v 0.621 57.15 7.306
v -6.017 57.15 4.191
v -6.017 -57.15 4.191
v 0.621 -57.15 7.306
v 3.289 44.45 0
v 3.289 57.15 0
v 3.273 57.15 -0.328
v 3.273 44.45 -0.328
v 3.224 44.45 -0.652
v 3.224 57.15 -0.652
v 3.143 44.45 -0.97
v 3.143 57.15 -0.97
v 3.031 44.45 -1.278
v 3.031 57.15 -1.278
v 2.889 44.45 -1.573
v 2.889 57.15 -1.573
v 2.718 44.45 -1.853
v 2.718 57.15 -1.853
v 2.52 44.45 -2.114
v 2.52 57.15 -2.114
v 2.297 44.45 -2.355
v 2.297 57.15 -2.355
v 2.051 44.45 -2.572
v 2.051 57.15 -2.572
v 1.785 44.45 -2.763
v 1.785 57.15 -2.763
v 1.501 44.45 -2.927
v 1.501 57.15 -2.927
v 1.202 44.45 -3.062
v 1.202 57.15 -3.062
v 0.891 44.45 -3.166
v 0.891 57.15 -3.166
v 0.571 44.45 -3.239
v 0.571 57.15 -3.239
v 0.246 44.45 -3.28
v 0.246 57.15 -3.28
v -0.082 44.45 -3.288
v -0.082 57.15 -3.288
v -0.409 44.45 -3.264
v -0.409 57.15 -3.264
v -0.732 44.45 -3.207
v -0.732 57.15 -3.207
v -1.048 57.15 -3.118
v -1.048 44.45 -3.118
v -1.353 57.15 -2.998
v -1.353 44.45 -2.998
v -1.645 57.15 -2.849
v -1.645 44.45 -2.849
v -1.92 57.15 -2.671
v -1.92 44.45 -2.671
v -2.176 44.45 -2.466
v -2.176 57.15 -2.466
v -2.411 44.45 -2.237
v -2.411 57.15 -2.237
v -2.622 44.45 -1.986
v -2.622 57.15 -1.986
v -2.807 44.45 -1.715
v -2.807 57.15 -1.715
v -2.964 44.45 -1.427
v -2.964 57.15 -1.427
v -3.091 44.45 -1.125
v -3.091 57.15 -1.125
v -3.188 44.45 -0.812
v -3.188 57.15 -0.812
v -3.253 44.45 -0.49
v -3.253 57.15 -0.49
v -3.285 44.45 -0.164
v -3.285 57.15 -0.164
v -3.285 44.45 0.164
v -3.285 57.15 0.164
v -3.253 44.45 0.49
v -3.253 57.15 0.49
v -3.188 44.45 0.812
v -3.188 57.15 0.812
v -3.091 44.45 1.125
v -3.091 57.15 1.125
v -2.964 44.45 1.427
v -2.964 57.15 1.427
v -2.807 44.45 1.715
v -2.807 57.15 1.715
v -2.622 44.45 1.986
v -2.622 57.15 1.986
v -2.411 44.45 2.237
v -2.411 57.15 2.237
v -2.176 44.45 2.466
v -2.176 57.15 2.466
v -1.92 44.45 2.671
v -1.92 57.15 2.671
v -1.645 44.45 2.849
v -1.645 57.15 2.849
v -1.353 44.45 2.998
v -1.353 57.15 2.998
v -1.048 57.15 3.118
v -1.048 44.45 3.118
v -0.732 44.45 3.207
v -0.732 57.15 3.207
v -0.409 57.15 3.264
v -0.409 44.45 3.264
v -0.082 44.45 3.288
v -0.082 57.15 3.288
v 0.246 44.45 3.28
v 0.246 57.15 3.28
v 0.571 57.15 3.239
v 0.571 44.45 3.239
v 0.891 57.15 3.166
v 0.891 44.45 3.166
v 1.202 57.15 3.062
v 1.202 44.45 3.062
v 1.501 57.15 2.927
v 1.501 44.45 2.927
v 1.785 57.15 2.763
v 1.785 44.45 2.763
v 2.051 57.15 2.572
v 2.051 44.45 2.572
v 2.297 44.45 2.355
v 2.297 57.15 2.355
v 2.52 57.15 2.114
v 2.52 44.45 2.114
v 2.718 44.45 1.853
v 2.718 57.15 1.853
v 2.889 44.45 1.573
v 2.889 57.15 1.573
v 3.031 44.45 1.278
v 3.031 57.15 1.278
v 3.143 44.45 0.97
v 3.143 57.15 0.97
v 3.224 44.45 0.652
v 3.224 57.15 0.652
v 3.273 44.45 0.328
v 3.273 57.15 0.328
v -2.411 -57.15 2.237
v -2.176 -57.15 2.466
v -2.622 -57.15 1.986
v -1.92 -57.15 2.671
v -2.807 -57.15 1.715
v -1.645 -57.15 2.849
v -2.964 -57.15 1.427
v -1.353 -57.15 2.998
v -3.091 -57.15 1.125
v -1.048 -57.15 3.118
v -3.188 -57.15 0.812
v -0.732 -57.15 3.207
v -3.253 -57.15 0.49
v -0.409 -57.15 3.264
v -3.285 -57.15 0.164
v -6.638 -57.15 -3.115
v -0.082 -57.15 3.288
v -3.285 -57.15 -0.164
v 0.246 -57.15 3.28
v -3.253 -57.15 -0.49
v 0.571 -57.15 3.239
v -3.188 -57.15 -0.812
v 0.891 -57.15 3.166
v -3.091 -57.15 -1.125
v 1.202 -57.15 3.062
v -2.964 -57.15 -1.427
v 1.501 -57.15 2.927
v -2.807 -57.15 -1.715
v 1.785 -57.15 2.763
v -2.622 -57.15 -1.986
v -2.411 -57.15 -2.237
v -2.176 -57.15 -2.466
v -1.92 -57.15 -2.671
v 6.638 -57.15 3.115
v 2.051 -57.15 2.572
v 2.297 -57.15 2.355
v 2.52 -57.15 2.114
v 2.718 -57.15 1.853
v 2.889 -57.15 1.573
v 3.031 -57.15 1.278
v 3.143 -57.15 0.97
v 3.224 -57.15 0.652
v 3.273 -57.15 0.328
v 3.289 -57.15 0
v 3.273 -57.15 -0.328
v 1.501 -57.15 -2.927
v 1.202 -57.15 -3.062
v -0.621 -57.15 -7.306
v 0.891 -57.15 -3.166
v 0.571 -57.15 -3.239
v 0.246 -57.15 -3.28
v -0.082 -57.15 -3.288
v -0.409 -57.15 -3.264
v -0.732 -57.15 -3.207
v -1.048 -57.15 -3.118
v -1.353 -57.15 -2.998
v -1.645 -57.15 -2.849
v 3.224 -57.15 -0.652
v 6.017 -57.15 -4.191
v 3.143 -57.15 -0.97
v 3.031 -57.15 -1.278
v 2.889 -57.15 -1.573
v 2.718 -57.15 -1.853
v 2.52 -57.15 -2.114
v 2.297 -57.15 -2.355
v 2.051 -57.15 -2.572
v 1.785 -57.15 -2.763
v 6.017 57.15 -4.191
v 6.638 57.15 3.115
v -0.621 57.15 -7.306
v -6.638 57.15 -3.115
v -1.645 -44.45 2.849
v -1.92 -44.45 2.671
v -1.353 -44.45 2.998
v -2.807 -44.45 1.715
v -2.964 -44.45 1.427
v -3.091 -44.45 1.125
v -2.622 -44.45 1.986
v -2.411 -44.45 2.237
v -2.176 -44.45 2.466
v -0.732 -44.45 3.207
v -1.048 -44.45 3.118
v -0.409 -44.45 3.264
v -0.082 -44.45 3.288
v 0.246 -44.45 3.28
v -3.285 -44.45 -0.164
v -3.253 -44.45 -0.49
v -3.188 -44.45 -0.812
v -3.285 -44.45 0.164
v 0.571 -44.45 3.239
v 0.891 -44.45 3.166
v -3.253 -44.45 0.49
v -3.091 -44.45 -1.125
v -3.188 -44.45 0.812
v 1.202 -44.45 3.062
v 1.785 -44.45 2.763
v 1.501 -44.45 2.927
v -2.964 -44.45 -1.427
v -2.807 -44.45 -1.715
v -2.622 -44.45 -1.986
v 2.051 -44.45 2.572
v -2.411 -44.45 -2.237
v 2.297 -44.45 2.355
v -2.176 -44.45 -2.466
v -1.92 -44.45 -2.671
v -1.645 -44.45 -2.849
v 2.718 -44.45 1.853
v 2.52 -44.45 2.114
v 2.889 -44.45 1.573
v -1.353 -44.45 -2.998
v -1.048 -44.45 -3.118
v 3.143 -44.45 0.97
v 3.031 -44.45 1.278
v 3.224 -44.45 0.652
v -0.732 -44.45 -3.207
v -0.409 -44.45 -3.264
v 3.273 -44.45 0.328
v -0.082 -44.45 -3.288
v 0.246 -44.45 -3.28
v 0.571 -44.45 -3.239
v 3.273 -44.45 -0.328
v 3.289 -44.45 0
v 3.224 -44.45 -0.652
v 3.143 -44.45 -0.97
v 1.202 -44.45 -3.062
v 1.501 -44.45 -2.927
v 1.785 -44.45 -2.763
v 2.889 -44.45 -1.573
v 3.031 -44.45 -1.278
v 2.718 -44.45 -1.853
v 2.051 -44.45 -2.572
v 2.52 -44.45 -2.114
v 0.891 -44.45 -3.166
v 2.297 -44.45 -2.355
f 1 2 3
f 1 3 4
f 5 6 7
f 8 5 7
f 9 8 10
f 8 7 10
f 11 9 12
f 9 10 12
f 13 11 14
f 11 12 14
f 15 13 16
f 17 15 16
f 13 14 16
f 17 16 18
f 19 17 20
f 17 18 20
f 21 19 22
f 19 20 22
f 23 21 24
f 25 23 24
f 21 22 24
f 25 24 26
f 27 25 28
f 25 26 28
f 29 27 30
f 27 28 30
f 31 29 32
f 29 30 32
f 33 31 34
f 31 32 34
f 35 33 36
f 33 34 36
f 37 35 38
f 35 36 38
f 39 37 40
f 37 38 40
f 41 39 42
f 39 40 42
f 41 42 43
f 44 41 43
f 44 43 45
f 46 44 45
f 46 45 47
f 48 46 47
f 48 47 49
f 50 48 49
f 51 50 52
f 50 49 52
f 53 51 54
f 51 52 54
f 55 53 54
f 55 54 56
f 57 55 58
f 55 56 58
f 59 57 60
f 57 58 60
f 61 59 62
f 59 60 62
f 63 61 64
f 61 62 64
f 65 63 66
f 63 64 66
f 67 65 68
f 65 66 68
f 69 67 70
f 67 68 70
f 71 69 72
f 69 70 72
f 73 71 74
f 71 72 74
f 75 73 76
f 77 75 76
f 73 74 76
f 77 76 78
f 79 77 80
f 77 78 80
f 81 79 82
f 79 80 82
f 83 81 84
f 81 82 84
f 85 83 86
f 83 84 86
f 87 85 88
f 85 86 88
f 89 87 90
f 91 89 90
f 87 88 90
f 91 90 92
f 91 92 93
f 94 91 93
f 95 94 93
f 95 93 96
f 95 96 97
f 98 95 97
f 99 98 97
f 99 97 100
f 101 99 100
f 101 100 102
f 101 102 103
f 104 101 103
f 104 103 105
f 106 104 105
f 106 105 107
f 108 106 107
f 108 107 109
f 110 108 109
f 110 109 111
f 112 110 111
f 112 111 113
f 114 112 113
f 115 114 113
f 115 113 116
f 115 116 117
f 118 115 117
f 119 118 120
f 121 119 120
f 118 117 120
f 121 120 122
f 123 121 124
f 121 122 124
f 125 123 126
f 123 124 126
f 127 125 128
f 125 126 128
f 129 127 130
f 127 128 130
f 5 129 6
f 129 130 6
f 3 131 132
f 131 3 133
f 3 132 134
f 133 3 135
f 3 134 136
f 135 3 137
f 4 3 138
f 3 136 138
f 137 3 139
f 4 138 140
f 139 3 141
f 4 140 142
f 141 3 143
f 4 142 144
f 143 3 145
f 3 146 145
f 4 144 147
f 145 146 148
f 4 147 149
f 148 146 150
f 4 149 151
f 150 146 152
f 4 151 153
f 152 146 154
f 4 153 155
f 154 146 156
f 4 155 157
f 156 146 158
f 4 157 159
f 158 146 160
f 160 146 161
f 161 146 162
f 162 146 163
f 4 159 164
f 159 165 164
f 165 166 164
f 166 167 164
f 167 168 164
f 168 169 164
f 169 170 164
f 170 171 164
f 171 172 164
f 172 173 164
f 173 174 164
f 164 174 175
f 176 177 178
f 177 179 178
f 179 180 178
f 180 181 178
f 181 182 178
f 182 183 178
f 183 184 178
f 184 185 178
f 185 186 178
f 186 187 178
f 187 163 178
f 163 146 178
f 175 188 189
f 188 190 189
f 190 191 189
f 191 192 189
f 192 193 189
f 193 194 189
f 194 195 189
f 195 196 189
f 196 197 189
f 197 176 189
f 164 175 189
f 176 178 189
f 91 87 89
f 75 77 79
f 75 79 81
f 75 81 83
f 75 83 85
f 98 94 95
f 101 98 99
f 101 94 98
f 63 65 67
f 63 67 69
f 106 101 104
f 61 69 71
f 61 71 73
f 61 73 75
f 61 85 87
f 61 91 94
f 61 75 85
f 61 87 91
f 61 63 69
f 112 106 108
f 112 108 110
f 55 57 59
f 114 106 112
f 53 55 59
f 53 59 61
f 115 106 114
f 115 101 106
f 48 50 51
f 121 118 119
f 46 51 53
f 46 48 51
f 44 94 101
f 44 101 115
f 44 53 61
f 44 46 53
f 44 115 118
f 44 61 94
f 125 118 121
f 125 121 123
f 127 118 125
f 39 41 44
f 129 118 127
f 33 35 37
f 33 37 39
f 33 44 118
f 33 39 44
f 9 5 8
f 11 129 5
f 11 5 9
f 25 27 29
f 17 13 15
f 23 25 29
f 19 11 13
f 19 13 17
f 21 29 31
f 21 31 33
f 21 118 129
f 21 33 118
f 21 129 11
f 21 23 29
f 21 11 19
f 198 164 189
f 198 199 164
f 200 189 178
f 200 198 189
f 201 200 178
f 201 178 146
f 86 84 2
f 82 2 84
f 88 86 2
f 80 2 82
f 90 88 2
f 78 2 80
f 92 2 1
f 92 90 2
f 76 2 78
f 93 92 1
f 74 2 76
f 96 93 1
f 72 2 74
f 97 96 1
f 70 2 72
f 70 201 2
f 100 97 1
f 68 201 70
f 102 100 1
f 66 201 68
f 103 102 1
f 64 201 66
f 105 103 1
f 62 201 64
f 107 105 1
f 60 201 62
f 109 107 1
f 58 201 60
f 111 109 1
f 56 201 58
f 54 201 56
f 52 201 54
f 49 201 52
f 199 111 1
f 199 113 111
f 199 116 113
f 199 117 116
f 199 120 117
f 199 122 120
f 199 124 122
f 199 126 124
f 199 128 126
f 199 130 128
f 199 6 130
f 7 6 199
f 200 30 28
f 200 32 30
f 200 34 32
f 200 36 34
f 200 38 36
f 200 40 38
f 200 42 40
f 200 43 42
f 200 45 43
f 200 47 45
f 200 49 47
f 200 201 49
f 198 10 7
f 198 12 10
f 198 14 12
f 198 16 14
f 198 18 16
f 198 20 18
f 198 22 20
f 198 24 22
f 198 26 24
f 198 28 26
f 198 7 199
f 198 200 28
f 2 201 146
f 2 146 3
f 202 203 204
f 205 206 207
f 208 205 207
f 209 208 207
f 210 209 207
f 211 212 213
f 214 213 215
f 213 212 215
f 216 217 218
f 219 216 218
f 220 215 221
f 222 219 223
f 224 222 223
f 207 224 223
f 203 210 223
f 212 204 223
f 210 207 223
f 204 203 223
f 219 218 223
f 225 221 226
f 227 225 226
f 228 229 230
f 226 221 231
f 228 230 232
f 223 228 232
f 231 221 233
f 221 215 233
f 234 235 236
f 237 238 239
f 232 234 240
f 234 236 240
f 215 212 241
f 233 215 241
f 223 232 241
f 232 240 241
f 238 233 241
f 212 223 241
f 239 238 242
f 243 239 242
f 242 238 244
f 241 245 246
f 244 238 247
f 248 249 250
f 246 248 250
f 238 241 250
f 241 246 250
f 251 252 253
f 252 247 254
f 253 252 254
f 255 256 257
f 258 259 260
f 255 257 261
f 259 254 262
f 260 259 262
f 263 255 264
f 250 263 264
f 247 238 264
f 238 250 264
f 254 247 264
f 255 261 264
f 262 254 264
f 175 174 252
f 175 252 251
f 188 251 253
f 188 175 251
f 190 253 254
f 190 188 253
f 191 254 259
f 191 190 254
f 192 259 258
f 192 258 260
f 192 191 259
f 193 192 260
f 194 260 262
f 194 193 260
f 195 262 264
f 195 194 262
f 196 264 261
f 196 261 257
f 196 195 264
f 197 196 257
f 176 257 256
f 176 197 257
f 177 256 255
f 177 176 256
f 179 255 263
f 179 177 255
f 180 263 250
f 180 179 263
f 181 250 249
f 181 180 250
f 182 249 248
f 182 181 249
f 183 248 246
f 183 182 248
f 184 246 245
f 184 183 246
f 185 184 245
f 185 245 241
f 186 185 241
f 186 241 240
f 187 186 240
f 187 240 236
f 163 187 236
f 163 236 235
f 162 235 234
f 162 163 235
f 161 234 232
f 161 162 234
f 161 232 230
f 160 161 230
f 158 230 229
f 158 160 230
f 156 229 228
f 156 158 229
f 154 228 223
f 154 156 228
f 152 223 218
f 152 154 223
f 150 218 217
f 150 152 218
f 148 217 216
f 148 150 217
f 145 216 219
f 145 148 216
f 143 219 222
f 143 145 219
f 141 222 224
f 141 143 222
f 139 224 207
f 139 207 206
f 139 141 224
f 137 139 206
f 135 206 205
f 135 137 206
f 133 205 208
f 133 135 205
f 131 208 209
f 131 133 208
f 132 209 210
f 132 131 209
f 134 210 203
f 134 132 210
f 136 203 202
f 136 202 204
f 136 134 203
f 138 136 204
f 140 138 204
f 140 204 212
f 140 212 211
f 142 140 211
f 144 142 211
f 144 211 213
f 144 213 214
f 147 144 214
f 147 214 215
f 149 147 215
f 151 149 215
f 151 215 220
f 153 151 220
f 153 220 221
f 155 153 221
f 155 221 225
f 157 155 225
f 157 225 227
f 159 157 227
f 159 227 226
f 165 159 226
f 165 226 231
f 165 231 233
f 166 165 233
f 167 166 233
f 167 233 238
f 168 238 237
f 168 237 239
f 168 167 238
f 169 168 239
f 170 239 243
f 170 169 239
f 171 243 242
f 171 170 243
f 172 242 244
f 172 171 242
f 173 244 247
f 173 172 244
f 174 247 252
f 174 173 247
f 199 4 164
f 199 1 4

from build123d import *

# Parameters (mm, degrees)
BOSS_EXTRUDE1_DEPTH = 57.15
SKETCH2_R           = 3.2893
CUT_EXTRUDE1_DEPTH  = 12.7


with BuildPart() as part:
    # Sketch1 → Boss-Extrude1 (new body, symmetric)
    with BuildSketch(Plane(origin=(0, 0, 0), x_dir=(1, 0, 0), z_dir=(0, 1, 0))):
        Polygon((6.016541477, 4.191009662), (-0.621250096, 7.305982593), (-6.637791573, 3.114972932), (-6.016541477, -4.191009662), (0.621250096, -7.305982593), (6.637791573, -3.114972932), align=None)
    extrude(amount=BOSS_EXTRUDE1_DEPTH, both=True)

    # Sketch2 → Cut-Extrude1 (cut)
    with BuildSketch(Plane(origin=(0, 57.15, 0), x_dir=(1, 0, 0), z_dir=(0, 1, 0))):
        Circle(SKETCH2_R)
    cut_extrude1 = extrude(amount=-CUT_EXTRUDE1_DEPTH, mode=Mode.SUBTRACT)

    # Mirror1: Cut-Extrude1 across plane
    add(cut_extrude1.mirror(Plane.ZX), mode=Mode.SUBTRACT)


solid = part.part
